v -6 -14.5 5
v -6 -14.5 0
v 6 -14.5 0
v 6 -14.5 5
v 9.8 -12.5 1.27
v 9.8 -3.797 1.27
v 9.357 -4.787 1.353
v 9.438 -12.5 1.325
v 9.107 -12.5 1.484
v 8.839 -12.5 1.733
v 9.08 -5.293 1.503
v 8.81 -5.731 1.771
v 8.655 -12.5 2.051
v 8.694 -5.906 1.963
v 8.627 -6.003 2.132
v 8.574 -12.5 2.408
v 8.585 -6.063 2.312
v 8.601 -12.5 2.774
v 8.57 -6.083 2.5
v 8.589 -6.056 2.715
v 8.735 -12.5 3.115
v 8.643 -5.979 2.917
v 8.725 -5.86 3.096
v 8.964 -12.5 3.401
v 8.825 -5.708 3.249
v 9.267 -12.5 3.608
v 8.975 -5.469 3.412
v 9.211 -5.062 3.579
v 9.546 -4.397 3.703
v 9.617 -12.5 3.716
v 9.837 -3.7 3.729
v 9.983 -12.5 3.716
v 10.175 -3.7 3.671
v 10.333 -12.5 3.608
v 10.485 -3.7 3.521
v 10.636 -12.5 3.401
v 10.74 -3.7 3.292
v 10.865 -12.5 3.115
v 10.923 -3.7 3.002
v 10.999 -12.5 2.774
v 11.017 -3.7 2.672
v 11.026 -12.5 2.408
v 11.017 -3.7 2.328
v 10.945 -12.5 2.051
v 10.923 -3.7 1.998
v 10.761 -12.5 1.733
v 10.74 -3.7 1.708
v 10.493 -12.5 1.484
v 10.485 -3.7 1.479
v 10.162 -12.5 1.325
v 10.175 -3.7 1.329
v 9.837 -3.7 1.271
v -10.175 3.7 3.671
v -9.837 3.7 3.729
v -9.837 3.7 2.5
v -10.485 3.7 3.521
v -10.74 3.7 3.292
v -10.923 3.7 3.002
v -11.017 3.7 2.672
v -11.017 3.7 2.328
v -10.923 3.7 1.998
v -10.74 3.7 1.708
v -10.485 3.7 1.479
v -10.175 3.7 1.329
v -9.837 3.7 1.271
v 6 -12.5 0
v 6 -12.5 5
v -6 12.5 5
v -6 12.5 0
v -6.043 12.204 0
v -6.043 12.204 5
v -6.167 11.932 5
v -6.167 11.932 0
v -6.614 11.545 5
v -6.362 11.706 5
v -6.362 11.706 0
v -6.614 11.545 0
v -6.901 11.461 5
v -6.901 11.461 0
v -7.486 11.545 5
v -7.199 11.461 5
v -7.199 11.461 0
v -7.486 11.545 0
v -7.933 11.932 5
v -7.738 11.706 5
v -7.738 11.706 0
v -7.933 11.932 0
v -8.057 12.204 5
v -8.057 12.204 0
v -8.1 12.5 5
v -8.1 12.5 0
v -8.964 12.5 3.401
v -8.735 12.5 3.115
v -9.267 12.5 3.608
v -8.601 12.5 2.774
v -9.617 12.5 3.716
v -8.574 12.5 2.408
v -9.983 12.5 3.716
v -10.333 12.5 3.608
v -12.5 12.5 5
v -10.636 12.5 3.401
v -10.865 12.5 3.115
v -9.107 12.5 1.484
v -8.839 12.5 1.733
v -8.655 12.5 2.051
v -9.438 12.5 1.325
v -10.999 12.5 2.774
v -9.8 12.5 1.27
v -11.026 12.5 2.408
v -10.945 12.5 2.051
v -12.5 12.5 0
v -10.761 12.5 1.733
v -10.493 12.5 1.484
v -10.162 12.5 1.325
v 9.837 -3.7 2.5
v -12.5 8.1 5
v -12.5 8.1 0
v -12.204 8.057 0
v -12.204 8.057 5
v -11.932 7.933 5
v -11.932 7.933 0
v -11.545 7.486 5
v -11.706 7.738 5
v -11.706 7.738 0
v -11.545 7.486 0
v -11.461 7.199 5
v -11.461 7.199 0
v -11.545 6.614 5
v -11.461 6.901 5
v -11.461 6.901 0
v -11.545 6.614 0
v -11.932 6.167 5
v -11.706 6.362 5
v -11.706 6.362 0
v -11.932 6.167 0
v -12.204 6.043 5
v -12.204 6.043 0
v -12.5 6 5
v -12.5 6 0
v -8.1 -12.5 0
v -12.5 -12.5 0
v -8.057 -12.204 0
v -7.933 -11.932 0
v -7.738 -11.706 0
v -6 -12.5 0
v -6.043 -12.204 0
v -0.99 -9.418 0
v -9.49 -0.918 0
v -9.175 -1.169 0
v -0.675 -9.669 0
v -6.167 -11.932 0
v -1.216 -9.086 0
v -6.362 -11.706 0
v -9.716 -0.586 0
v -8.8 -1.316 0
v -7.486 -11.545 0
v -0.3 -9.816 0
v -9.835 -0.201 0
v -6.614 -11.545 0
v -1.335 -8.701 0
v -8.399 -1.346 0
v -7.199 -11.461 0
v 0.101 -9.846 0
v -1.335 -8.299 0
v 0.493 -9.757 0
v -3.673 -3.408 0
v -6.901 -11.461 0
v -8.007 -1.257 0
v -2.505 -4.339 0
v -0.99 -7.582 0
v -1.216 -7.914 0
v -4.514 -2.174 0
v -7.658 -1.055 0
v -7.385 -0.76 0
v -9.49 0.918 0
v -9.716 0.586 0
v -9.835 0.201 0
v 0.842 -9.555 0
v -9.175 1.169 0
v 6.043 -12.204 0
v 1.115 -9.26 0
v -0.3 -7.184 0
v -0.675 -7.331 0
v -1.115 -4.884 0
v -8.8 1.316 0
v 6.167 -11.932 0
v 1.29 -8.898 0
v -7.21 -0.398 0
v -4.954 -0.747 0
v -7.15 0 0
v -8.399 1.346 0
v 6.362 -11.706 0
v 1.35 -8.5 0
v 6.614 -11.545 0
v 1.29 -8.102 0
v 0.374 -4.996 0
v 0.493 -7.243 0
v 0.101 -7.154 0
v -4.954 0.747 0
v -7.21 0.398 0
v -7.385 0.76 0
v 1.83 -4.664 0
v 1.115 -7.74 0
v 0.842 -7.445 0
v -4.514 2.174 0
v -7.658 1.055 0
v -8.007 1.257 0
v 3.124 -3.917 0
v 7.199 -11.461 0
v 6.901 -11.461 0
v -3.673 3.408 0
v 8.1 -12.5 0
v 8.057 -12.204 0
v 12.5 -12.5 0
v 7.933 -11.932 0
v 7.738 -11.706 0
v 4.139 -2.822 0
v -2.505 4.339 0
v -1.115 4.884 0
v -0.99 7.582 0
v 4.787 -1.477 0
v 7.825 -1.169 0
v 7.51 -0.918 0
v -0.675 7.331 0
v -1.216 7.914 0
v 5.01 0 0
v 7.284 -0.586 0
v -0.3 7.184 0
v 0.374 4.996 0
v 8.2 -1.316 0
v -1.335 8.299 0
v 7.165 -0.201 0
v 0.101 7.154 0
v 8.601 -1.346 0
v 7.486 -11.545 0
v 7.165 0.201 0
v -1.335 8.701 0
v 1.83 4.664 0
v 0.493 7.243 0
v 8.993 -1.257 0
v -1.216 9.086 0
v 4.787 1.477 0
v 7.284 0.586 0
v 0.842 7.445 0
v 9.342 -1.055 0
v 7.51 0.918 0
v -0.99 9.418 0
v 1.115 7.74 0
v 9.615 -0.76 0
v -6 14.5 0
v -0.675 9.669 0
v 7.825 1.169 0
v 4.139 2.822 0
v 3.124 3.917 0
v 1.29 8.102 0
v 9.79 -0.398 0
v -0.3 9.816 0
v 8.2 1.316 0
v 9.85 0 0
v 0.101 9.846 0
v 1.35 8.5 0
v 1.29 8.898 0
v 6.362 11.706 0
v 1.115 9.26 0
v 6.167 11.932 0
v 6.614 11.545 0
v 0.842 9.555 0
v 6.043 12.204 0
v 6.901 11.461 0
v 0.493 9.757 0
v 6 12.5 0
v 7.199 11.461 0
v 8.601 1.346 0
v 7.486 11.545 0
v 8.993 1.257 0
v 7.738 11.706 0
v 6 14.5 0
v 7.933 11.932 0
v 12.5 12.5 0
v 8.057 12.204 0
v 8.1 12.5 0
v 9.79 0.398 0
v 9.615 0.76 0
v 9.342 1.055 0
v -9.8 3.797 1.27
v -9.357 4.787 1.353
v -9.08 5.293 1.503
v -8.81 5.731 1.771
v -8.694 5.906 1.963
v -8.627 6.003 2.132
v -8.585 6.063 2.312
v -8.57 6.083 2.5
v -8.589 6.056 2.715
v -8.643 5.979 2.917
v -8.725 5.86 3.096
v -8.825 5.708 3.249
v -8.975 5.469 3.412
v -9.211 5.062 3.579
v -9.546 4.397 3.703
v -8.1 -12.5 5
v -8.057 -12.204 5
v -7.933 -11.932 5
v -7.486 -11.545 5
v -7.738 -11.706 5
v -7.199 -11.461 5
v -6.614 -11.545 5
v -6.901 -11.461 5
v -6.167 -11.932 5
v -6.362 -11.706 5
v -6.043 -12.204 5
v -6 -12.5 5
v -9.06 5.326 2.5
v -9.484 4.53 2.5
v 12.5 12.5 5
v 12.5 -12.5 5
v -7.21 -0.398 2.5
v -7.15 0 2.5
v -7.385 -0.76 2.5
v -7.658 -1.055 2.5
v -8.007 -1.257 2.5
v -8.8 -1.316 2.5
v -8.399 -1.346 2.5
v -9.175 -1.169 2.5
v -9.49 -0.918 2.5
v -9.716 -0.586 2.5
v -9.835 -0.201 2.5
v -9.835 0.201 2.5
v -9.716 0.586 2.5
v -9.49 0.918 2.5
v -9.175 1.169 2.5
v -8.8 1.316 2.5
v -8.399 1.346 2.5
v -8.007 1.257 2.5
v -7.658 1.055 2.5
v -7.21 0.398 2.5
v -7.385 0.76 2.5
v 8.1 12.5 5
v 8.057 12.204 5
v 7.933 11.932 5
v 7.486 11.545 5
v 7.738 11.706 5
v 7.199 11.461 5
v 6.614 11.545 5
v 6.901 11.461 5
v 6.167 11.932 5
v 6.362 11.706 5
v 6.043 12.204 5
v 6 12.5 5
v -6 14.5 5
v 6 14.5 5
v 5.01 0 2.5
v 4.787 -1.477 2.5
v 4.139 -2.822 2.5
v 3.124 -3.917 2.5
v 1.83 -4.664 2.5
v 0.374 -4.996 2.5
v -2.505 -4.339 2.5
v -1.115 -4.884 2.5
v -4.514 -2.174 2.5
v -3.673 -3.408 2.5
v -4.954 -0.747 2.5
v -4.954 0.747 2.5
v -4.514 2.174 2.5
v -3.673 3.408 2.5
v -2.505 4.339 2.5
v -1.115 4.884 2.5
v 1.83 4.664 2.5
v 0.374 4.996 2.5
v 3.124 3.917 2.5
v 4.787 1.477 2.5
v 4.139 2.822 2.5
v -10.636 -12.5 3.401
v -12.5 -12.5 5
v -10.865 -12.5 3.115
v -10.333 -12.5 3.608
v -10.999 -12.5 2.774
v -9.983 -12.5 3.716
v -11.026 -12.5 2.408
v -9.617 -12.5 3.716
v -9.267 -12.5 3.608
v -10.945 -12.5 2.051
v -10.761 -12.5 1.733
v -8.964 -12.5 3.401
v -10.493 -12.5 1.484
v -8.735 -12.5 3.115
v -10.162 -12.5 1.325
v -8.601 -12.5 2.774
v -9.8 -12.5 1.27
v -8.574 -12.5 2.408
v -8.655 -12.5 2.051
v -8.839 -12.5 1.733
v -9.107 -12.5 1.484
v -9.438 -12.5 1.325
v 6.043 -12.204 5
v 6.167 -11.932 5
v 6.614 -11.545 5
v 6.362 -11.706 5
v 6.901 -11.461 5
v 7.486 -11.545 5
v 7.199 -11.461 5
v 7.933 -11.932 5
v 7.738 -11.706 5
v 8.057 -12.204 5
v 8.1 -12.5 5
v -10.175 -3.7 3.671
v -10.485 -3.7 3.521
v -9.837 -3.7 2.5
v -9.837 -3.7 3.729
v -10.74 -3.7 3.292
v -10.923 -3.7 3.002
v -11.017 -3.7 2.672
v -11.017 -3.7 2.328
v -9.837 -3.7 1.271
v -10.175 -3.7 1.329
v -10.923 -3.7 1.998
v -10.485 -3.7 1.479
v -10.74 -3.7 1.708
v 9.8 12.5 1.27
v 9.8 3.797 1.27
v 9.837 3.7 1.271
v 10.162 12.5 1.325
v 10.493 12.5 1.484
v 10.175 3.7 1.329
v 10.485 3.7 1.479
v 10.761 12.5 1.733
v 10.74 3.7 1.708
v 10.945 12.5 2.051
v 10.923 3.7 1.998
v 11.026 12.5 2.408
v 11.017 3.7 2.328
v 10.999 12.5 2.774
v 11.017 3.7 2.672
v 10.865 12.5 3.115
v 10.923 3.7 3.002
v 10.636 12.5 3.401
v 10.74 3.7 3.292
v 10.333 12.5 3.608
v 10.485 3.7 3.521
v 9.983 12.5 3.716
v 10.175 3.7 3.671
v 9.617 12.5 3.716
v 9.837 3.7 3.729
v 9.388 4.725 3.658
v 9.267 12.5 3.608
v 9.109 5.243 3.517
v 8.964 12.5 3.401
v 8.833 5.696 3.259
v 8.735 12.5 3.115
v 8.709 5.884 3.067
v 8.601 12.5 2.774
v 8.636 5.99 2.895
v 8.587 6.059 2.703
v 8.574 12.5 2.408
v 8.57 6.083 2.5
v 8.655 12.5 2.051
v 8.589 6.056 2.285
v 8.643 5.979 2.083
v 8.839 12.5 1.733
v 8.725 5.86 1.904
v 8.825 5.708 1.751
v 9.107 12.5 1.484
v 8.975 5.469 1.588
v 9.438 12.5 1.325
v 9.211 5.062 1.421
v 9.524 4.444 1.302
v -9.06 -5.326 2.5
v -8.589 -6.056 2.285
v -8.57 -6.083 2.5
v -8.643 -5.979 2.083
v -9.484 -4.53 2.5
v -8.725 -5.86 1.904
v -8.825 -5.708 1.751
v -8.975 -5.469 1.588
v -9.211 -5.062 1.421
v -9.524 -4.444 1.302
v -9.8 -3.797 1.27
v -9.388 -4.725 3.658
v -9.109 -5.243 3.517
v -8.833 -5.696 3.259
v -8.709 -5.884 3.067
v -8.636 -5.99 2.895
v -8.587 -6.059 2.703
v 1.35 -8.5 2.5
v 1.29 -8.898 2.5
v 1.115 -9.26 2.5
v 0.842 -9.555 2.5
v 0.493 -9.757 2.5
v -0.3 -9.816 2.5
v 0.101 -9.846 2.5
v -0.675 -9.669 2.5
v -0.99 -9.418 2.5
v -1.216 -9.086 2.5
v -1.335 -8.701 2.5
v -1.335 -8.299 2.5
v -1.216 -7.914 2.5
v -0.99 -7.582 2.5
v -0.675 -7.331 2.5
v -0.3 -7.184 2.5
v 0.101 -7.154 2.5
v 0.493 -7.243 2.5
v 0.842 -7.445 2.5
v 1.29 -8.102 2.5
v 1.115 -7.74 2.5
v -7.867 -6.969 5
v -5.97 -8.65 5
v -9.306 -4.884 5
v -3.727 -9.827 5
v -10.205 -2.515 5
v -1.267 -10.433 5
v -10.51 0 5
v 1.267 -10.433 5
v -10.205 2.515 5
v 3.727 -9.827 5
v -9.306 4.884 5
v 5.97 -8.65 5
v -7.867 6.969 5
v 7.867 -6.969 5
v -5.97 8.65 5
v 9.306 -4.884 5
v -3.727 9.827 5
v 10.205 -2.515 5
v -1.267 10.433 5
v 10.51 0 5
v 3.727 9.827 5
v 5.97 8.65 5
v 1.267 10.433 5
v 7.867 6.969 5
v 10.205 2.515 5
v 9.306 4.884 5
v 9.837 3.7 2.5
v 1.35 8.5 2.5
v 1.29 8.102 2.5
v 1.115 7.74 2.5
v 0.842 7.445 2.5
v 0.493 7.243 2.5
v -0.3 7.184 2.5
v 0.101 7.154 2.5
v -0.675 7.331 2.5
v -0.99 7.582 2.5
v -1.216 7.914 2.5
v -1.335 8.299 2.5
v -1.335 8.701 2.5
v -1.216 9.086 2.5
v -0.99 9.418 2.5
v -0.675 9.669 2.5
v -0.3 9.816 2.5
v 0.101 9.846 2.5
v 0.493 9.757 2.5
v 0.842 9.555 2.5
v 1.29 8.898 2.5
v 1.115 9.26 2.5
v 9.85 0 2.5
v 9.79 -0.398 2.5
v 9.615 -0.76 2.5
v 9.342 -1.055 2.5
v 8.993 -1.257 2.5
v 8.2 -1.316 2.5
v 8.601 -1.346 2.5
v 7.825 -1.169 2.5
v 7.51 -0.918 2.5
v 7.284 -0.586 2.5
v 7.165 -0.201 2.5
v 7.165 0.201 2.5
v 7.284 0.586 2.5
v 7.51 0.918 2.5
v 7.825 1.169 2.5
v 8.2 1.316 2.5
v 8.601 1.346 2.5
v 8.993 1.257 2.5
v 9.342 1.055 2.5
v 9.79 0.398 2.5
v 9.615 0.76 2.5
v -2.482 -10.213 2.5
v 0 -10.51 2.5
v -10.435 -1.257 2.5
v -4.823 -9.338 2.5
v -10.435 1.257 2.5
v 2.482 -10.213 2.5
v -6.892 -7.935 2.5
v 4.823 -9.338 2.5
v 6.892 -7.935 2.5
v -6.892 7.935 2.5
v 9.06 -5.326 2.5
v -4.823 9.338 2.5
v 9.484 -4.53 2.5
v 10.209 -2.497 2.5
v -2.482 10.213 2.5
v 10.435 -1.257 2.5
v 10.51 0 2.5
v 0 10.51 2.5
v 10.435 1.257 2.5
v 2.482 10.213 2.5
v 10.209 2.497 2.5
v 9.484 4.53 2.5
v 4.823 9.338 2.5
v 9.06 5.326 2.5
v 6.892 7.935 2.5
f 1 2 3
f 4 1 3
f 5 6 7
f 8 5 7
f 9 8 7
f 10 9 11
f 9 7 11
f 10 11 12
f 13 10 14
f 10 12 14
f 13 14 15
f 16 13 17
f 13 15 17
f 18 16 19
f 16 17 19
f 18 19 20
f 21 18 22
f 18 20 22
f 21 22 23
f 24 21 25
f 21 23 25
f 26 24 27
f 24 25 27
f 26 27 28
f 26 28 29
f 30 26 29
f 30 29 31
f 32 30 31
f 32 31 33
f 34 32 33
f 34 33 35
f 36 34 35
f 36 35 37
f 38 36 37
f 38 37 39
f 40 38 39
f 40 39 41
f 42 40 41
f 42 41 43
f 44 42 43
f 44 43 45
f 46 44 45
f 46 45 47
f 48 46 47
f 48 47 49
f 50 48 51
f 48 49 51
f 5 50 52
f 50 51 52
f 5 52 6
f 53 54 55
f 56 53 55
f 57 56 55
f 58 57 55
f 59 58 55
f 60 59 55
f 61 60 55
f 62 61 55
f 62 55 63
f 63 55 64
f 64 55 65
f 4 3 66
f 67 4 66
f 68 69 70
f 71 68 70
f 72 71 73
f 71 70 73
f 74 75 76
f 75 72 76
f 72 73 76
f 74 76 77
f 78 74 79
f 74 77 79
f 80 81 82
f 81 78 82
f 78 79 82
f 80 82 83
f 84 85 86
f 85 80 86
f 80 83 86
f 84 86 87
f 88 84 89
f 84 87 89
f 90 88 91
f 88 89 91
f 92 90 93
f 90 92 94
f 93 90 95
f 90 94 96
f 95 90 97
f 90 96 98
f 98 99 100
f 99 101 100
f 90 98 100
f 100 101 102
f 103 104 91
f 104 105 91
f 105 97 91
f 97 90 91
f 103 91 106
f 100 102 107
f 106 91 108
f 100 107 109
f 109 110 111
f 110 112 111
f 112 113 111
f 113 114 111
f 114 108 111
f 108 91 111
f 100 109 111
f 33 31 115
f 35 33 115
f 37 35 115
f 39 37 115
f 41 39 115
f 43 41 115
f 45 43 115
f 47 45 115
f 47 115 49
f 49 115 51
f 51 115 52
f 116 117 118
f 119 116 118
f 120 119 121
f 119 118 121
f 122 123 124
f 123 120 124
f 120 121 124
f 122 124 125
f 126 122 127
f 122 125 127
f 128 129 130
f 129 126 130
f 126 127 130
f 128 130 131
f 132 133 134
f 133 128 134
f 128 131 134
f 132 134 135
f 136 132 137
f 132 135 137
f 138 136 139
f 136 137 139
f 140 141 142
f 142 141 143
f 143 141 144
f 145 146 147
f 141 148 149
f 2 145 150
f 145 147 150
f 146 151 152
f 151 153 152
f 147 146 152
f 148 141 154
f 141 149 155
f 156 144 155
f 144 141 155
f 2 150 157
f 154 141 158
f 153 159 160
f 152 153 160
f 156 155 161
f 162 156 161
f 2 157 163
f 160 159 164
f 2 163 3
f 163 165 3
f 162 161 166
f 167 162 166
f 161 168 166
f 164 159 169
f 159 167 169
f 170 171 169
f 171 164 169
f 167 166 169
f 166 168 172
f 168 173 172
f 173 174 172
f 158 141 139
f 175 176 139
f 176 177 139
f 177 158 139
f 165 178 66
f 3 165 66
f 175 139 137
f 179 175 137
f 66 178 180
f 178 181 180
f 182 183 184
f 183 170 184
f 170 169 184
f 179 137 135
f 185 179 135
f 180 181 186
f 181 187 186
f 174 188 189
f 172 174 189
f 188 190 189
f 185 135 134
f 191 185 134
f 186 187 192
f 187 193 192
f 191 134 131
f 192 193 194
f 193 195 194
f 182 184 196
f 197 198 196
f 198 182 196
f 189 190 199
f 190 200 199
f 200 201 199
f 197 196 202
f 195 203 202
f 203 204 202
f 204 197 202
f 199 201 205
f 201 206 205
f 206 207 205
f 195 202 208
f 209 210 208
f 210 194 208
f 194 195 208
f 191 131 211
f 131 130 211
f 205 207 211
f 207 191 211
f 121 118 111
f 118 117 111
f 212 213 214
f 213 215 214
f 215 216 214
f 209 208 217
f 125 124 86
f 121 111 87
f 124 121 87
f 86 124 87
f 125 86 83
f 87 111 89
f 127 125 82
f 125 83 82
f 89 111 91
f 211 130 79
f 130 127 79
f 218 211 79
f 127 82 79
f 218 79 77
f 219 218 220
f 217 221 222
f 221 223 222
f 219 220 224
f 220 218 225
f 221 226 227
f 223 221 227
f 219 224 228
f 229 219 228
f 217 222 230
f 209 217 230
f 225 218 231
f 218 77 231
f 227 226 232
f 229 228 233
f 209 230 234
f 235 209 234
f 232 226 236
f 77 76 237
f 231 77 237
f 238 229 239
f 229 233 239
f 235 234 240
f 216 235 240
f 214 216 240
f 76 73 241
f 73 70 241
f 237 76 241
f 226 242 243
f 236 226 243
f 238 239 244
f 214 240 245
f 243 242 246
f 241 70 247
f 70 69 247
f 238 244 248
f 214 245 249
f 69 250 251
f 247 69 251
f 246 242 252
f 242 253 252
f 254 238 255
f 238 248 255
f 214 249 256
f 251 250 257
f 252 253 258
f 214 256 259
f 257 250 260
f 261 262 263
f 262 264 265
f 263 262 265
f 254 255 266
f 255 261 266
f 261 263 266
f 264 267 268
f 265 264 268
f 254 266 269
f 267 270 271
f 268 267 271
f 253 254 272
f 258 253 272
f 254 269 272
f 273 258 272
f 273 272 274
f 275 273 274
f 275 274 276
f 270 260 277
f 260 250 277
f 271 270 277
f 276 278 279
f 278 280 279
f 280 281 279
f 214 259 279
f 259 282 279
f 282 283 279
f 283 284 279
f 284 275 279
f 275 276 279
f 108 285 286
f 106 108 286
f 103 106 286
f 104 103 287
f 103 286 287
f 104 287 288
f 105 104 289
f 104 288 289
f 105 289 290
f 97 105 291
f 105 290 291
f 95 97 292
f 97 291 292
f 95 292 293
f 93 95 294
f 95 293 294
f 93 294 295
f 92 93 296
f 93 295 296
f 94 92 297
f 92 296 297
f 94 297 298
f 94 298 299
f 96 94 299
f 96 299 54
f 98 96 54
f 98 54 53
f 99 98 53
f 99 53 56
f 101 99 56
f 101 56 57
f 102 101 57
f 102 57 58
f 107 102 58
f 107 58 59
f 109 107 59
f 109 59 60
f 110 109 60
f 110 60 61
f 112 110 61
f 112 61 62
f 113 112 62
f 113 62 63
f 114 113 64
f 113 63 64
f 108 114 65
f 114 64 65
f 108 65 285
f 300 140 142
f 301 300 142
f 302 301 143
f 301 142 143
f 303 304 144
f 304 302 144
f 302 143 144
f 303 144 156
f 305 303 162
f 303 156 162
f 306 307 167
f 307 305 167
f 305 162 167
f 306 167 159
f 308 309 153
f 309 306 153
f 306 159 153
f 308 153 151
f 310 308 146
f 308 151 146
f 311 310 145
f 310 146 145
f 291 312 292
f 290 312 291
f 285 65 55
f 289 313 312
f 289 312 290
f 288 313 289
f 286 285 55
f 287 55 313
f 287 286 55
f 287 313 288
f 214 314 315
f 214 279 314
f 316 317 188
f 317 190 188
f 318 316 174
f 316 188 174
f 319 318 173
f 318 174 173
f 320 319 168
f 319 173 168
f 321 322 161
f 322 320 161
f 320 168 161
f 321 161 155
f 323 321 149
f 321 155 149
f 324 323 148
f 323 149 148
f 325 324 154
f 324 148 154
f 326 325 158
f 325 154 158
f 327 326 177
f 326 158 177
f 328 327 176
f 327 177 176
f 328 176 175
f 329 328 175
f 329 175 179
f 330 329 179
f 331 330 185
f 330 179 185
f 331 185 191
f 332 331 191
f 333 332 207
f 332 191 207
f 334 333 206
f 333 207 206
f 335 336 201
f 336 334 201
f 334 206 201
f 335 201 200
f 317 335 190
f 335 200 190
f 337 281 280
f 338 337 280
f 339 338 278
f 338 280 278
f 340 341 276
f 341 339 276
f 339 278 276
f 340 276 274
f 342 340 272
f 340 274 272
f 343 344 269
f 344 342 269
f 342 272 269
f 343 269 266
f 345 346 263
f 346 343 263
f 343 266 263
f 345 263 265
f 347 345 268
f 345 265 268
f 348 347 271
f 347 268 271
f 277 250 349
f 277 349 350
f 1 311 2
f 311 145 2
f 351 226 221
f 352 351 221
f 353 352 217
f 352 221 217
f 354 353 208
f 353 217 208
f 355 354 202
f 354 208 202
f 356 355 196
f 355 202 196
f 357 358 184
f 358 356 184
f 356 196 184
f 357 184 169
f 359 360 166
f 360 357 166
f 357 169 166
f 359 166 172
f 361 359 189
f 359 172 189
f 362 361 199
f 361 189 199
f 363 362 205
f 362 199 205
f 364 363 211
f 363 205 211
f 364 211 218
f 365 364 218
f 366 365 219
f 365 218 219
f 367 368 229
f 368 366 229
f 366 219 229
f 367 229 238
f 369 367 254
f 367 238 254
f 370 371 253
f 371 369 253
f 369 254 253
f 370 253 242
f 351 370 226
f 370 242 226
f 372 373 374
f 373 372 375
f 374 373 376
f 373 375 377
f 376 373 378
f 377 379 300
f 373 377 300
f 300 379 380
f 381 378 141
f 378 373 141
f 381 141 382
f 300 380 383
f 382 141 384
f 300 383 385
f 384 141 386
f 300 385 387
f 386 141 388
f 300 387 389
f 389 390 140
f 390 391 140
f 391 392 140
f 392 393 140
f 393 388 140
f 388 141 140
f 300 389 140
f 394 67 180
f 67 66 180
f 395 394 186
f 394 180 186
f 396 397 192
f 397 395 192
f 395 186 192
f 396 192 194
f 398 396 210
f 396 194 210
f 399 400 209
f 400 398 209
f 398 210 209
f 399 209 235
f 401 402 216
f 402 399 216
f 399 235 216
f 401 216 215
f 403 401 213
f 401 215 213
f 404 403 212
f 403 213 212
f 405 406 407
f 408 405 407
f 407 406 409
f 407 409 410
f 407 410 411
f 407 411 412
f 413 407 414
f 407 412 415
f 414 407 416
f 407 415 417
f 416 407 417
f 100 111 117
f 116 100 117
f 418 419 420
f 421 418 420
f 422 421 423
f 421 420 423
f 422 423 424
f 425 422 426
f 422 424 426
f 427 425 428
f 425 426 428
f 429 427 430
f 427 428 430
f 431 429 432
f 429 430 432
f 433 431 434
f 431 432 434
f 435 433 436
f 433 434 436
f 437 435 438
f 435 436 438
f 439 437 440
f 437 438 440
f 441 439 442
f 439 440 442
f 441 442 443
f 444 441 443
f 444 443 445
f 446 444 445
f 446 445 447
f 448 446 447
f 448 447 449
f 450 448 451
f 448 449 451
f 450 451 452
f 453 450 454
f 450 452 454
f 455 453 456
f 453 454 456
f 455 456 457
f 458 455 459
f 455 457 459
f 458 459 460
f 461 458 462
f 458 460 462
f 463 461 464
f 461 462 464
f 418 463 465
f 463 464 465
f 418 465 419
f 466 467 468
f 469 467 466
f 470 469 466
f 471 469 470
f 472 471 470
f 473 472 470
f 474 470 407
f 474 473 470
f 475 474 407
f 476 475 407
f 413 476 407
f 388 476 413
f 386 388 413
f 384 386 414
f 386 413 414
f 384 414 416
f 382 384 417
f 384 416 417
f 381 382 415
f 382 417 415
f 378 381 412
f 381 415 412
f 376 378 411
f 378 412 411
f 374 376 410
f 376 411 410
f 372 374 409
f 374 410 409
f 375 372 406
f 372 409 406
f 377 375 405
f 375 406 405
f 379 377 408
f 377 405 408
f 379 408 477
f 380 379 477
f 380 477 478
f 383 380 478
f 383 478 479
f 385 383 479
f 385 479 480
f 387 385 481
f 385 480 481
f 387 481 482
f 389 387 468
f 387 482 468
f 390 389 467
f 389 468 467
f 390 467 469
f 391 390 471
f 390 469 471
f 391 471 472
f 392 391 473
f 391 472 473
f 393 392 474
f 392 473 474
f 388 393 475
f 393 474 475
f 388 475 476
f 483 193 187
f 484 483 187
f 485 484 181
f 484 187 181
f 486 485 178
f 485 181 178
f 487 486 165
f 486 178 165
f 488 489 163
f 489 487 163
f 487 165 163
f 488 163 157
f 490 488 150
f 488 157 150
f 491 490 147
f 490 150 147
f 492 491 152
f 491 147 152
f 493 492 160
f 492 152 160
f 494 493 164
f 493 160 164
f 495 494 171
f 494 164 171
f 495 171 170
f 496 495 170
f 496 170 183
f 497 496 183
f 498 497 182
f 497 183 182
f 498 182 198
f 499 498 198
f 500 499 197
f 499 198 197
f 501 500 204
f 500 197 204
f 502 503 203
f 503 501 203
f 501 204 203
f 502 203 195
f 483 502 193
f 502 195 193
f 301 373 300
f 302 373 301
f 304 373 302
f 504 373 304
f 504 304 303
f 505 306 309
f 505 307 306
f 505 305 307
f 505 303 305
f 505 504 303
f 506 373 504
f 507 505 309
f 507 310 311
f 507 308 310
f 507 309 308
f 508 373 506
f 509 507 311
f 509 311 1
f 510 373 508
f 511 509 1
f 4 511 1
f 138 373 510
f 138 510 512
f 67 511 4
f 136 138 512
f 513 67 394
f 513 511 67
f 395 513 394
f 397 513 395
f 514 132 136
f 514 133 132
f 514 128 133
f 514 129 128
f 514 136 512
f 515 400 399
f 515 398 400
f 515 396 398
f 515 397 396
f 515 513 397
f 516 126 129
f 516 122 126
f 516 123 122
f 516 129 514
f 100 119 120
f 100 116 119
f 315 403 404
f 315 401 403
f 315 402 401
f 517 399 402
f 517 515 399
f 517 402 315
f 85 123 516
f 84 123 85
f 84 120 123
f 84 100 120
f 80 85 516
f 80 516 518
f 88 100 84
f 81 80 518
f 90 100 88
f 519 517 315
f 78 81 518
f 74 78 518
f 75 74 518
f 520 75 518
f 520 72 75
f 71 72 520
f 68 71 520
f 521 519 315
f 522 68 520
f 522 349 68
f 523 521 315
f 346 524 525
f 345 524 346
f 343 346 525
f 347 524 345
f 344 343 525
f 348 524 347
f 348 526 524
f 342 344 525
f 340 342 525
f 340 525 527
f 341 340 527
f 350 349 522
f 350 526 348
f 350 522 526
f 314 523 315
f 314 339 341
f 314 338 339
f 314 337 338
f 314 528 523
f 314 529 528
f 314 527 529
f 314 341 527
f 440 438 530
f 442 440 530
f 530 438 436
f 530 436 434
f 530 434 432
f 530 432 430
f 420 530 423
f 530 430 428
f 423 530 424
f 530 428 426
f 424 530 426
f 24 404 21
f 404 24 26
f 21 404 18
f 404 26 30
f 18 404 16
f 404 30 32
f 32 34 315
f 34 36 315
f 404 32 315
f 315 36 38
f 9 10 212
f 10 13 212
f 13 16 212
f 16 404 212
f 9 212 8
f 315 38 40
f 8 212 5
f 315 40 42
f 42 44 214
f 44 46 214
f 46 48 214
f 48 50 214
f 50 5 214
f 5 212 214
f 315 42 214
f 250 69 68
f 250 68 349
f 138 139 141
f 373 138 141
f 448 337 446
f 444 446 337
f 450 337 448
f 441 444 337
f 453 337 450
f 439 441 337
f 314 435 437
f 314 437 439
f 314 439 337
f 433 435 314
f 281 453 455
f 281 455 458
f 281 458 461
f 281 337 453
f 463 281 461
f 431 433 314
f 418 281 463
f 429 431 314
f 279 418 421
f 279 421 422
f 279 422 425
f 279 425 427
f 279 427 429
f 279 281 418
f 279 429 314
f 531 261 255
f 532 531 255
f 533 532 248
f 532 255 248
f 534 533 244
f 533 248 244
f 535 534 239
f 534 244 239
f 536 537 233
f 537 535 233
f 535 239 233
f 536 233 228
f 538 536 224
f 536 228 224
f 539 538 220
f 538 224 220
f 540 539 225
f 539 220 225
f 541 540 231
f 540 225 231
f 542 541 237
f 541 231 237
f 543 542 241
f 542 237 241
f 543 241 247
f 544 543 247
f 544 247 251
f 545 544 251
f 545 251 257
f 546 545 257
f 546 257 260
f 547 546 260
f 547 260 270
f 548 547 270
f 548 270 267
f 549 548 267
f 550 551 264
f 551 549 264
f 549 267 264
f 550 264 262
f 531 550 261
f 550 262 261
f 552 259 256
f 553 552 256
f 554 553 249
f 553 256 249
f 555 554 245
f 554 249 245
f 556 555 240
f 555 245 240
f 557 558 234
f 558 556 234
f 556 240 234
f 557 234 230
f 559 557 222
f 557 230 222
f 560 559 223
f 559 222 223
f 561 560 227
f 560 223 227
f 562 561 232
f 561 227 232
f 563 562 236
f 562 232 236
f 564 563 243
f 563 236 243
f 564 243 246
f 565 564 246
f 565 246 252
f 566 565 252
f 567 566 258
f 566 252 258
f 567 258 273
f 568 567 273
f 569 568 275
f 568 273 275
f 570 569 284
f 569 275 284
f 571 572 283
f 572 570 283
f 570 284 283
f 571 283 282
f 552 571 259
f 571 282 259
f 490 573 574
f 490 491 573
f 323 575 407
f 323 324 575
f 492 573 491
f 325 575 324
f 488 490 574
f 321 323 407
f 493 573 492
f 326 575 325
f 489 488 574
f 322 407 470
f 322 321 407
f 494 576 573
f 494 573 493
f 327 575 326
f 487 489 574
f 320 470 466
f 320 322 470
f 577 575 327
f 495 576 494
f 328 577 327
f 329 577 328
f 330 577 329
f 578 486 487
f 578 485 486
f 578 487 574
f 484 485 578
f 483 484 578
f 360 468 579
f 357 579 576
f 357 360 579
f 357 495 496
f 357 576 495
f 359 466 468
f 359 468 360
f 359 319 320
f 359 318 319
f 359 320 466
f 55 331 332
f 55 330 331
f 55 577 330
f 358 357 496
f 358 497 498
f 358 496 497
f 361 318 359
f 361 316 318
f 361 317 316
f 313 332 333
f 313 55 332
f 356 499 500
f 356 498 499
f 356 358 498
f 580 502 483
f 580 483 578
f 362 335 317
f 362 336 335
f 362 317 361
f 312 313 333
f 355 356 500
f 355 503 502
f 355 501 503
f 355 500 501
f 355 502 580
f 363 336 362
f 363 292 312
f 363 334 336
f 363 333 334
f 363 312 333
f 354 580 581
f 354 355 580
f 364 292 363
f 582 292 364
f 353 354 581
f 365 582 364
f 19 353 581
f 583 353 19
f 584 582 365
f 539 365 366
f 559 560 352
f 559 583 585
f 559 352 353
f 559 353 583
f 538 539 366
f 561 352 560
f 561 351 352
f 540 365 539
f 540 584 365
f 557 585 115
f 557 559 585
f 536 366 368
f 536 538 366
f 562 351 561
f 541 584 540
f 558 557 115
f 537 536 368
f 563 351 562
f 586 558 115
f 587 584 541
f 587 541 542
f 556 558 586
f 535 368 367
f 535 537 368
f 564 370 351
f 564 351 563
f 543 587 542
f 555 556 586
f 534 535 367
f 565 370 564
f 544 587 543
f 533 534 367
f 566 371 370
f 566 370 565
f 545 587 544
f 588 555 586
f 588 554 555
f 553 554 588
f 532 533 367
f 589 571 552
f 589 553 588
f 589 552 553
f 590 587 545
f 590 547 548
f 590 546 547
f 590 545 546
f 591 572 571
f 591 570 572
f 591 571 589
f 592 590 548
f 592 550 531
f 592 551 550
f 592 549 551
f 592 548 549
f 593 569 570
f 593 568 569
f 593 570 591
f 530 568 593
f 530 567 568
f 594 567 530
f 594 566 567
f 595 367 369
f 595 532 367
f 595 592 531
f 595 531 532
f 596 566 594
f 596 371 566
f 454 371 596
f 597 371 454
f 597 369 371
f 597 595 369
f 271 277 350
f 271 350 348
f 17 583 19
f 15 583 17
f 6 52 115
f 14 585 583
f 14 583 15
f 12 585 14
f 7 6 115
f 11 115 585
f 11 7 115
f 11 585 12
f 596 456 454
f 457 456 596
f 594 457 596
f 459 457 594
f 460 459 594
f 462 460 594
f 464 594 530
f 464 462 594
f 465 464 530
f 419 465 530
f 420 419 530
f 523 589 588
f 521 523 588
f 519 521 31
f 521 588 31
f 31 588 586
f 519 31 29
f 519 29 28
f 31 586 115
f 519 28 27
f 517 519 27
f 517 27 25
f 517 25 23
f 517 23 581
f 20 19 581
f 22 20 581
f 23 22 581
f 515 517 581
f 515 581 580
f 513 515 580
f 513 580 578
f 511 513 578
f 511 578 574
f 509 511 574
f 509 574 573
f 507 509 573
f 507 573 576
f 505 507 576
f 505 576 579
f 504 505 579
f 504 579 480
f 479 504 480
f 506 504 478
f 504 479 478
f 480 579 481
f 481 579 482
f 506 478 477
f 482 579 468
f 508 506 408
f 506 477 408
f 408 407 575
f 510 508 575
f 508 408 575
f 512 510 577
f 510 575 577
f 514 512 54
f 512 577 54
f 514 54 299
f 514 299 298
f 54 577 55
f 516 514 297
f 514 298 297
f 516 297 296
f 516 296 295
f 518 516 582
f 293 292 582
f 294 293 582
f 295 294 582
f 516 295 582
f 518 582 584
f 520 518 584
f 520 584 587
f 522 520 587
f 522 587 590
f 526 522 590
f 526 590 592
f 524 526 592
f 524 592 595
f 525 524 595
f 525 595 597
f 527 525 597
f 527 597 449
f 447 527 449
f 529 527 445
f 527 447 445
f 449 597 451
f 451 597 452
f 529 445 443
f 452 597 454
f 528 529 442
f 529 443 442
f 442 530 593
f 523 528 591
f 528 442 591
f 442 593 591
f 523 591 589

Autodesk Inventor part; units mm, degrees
ref_plane "YZ Plane" through (0, 0, 0) normal (1, 0, 0) x (0, 1, 0)
ref_plane "XZ Plane" through (0, 0, 0) normal (0, 1, 0) x (-1, 0, 0)
ref_plane "XY Plane" through (0, 0, 0) normal (0, 0, 1) x (1, 0, 0)
sketch "スケッチ1" plane through (0, 0, 0) normal (0, 0, 1) x (1, 0, 0)
  line L0 (-12.5, -12.5) -> (12.5, -12.5) construction
  line L1 (12.5, -12.5) -> (12.5, 12.5) construction
  line L2 (12.5, 12.5) -> (-12.5, 12.5) construction
  line L3 (-12.5, 12.5) -> (-12.5, -12.5) construction
  line L4 (-12.5, -12.5) -> (12.5, 12.5) construction
  line L5 (12.5, -12.5) -> (-12.5, 12.5) construction
  line L6 (-8.1, 12.5) -> (-12.5, 12.5)
  line L7 (-12.5, 12.5) -> (-12.5, 8.1)
  line L8 (8.1, 12.5) -> (12.5, 12.5)
  line L9 (12.5, 12.5) -> (12.5, 8.1)
  line L10 (-12.5, -8.1) -> (-12.5, -12.5)
  line L11 (-12.5, -12.5) -> (-8.1, -12.5)
  line L12 (8.1, -12.5) -> (12.5, -12.5)
  line L13 (12.5, -12.5) -> (12.5, -8.1)
  line L14 (-6, 12.5) -> (-6, 14.5)
  line L15 (-6, 14.5) -> (6, 14.5)
  line L16 (6, 14.5) -> (6, 12.5)
  arc A0 (-8.1, 12.5) -> (-6, 12.5) centre (-7.05, 12.5) ccw
  arc A1 (6, 12.5) -> (8.1, 12.5) centre (7.05, 12.5) ccw
  line L17 (0, 12.5) -> (0, 0) construction
  line L18 (0, 0) -> (12.5, 0) construction
  line L19 (-12.5, 6) -> (-14.5, 6) construction
  line L20 (-14.5, 6) -> (-14.5, -6) construction
  line L21 (-14.5, -6) -> (-12.5, -6) construction
  arc A2 (-12.5, 6) -> (-12.5, 8.1) centre (-12.5, 7.05) ccw
  arc A3 (-12.5, -8.1) -> (-12.5, -6) centre (-12.5, -7.05) ccw construction
  line L22 (-6, -12.5) -> (-6, -14.5)
  line L23 (-6, -14.5) -> (6, -14.5)
  line L24 (6, -14.5) -> (6, -12.5)
  arc A4 (-6, -12.5) -> (-8.1, -12.5) centre (-7.05, -12.5) ccw
  arc A5 (8.1, -12.5) -> (6, -12.5) centre (7.05, -12.5) ccw
  line L25 (12.5, 6) -> (14.5, 6) construction
  line L26 (14.5, 6) -> (14.5, -6) construction
  line L27 (14.5, -6) -> (12.5, -6) construction
  arc A6 (12.5, 8.1) -> (12.5, 6) centre (12.5, 7.05) ccw construction
  arc A7 (12.5, -6) -> (12.5, -8.1) centre (12.5, -7.05) ccw construction
  line L28 (-9.05, 12.5) -> (-5.95, 12.5) construction
  line L29 (-5.95, 12.5) -> (-5.95, 9.5) construction
  line L30 (-5.95, 9.5) -> (-9.05, 9.5) construction
  line L31 (-9.05, 9.5) -> (-9.05, 12.5) construction
  line L32 (-12.5, 9.05) -> (-9.5, 9.05) construction
  line L33 (-9.5, 5.95) -> (-12.5, 5.95) construction
  line L34 (-12.5, 5.95) -> (-12.5, 9.05) construction
  line L35 (-7.5, 12.5) -> (-7.5, 9.5) construction
  line L36 (-9.5, 7.5) -> (-12.5, 7.5) construction
  line L37 (-12.5, -12.5) -> (-12.5, 12.5)
  line L38 (12.5, -12.5) -> (12.5, 12.5)
  line L39 (0, -14.5) -> (0, 14.5) construction
  circle A8 centre (0, -8.5) radius 1.35
  circle A9 centre (8.5, 0) radius 1.35
  circle A10 centre (0, 8.5) radius 1.35
  circle A11 centre (-8.5, 0) radius 1.35
  circle A12 centre (0, 0) radius 5.01
  circle A13 centre (0, 0) radius 10.51
  point P0 (-12.5, 6)
  dimension "d0" = 25
  dimension "d1" = 1.05
  dimension "d2" = 2
  dimension "d3" = 6.5
  dimension "d4" = 3.1
  dimension "d6" = 3
  dimension "d17" = 5
  dimension "d18" = 5
  dimension "d46" = 25
  dimension "d58" = 2.7
  dimension "d59" = 8.5
  dimension "d62" = 360
  dimension "d64" = 10.02
  dimension "d65" = 21.02
extrude "押し出し1" add sketch "スケッチ1" along normal blind 5 contours A0 L14 L15 L16 A1 L8 L9 L38 L13 L12 A5 L24 L23 L22 A4 L11 L10 L37 A2 L7 L6
sketch "スケッチ2" plane through (-12.5, -12.5, 5) normal (0, -1, 0) x (1, 0, 0)
  line L0 (12.5, 0) -> (12.5, -5.2657) construction
  line L1 (0, -2.5) -> (22.3, -2.5) construction
  line L2 (0, -5) -> (0, 0) projected
  line L3 (6.5, 0) -> (18.5, 0) projected
  line L4 (25, -5) -> (25, 0) projected
  point P0 (12.5, -5)
  point P1 (2.7, -2.5)
  point P2 (0, -10)
  point P3 (25, -10)
  dimension "d55" = 2.5
  dimension "d56" = 2.7
  dimension "d57" = 2.7
hole "穴1" at (-9.8, -12.5, 2.5) at (9.8, -12.5, 2.5) direction (0, 1, 0) diameter 2.459 depth 8.8 thread size "M3x0.5" class "6H" standard "ISO Metric profile"
pattern_circular "円形状パターン1" count 2 over 360 about axis through (0, 0, -10) along (0, 0, 1) of "穴1"
extrude "押し出し7" add sketch "スケッチ1" along normal blind 2.5 contours A13
equation "\"d18\" = d17"
equation "\"d57\" = d56"
properties part number "頭_サーボホーンフレーム" material "アセタール樹脂、黒"
